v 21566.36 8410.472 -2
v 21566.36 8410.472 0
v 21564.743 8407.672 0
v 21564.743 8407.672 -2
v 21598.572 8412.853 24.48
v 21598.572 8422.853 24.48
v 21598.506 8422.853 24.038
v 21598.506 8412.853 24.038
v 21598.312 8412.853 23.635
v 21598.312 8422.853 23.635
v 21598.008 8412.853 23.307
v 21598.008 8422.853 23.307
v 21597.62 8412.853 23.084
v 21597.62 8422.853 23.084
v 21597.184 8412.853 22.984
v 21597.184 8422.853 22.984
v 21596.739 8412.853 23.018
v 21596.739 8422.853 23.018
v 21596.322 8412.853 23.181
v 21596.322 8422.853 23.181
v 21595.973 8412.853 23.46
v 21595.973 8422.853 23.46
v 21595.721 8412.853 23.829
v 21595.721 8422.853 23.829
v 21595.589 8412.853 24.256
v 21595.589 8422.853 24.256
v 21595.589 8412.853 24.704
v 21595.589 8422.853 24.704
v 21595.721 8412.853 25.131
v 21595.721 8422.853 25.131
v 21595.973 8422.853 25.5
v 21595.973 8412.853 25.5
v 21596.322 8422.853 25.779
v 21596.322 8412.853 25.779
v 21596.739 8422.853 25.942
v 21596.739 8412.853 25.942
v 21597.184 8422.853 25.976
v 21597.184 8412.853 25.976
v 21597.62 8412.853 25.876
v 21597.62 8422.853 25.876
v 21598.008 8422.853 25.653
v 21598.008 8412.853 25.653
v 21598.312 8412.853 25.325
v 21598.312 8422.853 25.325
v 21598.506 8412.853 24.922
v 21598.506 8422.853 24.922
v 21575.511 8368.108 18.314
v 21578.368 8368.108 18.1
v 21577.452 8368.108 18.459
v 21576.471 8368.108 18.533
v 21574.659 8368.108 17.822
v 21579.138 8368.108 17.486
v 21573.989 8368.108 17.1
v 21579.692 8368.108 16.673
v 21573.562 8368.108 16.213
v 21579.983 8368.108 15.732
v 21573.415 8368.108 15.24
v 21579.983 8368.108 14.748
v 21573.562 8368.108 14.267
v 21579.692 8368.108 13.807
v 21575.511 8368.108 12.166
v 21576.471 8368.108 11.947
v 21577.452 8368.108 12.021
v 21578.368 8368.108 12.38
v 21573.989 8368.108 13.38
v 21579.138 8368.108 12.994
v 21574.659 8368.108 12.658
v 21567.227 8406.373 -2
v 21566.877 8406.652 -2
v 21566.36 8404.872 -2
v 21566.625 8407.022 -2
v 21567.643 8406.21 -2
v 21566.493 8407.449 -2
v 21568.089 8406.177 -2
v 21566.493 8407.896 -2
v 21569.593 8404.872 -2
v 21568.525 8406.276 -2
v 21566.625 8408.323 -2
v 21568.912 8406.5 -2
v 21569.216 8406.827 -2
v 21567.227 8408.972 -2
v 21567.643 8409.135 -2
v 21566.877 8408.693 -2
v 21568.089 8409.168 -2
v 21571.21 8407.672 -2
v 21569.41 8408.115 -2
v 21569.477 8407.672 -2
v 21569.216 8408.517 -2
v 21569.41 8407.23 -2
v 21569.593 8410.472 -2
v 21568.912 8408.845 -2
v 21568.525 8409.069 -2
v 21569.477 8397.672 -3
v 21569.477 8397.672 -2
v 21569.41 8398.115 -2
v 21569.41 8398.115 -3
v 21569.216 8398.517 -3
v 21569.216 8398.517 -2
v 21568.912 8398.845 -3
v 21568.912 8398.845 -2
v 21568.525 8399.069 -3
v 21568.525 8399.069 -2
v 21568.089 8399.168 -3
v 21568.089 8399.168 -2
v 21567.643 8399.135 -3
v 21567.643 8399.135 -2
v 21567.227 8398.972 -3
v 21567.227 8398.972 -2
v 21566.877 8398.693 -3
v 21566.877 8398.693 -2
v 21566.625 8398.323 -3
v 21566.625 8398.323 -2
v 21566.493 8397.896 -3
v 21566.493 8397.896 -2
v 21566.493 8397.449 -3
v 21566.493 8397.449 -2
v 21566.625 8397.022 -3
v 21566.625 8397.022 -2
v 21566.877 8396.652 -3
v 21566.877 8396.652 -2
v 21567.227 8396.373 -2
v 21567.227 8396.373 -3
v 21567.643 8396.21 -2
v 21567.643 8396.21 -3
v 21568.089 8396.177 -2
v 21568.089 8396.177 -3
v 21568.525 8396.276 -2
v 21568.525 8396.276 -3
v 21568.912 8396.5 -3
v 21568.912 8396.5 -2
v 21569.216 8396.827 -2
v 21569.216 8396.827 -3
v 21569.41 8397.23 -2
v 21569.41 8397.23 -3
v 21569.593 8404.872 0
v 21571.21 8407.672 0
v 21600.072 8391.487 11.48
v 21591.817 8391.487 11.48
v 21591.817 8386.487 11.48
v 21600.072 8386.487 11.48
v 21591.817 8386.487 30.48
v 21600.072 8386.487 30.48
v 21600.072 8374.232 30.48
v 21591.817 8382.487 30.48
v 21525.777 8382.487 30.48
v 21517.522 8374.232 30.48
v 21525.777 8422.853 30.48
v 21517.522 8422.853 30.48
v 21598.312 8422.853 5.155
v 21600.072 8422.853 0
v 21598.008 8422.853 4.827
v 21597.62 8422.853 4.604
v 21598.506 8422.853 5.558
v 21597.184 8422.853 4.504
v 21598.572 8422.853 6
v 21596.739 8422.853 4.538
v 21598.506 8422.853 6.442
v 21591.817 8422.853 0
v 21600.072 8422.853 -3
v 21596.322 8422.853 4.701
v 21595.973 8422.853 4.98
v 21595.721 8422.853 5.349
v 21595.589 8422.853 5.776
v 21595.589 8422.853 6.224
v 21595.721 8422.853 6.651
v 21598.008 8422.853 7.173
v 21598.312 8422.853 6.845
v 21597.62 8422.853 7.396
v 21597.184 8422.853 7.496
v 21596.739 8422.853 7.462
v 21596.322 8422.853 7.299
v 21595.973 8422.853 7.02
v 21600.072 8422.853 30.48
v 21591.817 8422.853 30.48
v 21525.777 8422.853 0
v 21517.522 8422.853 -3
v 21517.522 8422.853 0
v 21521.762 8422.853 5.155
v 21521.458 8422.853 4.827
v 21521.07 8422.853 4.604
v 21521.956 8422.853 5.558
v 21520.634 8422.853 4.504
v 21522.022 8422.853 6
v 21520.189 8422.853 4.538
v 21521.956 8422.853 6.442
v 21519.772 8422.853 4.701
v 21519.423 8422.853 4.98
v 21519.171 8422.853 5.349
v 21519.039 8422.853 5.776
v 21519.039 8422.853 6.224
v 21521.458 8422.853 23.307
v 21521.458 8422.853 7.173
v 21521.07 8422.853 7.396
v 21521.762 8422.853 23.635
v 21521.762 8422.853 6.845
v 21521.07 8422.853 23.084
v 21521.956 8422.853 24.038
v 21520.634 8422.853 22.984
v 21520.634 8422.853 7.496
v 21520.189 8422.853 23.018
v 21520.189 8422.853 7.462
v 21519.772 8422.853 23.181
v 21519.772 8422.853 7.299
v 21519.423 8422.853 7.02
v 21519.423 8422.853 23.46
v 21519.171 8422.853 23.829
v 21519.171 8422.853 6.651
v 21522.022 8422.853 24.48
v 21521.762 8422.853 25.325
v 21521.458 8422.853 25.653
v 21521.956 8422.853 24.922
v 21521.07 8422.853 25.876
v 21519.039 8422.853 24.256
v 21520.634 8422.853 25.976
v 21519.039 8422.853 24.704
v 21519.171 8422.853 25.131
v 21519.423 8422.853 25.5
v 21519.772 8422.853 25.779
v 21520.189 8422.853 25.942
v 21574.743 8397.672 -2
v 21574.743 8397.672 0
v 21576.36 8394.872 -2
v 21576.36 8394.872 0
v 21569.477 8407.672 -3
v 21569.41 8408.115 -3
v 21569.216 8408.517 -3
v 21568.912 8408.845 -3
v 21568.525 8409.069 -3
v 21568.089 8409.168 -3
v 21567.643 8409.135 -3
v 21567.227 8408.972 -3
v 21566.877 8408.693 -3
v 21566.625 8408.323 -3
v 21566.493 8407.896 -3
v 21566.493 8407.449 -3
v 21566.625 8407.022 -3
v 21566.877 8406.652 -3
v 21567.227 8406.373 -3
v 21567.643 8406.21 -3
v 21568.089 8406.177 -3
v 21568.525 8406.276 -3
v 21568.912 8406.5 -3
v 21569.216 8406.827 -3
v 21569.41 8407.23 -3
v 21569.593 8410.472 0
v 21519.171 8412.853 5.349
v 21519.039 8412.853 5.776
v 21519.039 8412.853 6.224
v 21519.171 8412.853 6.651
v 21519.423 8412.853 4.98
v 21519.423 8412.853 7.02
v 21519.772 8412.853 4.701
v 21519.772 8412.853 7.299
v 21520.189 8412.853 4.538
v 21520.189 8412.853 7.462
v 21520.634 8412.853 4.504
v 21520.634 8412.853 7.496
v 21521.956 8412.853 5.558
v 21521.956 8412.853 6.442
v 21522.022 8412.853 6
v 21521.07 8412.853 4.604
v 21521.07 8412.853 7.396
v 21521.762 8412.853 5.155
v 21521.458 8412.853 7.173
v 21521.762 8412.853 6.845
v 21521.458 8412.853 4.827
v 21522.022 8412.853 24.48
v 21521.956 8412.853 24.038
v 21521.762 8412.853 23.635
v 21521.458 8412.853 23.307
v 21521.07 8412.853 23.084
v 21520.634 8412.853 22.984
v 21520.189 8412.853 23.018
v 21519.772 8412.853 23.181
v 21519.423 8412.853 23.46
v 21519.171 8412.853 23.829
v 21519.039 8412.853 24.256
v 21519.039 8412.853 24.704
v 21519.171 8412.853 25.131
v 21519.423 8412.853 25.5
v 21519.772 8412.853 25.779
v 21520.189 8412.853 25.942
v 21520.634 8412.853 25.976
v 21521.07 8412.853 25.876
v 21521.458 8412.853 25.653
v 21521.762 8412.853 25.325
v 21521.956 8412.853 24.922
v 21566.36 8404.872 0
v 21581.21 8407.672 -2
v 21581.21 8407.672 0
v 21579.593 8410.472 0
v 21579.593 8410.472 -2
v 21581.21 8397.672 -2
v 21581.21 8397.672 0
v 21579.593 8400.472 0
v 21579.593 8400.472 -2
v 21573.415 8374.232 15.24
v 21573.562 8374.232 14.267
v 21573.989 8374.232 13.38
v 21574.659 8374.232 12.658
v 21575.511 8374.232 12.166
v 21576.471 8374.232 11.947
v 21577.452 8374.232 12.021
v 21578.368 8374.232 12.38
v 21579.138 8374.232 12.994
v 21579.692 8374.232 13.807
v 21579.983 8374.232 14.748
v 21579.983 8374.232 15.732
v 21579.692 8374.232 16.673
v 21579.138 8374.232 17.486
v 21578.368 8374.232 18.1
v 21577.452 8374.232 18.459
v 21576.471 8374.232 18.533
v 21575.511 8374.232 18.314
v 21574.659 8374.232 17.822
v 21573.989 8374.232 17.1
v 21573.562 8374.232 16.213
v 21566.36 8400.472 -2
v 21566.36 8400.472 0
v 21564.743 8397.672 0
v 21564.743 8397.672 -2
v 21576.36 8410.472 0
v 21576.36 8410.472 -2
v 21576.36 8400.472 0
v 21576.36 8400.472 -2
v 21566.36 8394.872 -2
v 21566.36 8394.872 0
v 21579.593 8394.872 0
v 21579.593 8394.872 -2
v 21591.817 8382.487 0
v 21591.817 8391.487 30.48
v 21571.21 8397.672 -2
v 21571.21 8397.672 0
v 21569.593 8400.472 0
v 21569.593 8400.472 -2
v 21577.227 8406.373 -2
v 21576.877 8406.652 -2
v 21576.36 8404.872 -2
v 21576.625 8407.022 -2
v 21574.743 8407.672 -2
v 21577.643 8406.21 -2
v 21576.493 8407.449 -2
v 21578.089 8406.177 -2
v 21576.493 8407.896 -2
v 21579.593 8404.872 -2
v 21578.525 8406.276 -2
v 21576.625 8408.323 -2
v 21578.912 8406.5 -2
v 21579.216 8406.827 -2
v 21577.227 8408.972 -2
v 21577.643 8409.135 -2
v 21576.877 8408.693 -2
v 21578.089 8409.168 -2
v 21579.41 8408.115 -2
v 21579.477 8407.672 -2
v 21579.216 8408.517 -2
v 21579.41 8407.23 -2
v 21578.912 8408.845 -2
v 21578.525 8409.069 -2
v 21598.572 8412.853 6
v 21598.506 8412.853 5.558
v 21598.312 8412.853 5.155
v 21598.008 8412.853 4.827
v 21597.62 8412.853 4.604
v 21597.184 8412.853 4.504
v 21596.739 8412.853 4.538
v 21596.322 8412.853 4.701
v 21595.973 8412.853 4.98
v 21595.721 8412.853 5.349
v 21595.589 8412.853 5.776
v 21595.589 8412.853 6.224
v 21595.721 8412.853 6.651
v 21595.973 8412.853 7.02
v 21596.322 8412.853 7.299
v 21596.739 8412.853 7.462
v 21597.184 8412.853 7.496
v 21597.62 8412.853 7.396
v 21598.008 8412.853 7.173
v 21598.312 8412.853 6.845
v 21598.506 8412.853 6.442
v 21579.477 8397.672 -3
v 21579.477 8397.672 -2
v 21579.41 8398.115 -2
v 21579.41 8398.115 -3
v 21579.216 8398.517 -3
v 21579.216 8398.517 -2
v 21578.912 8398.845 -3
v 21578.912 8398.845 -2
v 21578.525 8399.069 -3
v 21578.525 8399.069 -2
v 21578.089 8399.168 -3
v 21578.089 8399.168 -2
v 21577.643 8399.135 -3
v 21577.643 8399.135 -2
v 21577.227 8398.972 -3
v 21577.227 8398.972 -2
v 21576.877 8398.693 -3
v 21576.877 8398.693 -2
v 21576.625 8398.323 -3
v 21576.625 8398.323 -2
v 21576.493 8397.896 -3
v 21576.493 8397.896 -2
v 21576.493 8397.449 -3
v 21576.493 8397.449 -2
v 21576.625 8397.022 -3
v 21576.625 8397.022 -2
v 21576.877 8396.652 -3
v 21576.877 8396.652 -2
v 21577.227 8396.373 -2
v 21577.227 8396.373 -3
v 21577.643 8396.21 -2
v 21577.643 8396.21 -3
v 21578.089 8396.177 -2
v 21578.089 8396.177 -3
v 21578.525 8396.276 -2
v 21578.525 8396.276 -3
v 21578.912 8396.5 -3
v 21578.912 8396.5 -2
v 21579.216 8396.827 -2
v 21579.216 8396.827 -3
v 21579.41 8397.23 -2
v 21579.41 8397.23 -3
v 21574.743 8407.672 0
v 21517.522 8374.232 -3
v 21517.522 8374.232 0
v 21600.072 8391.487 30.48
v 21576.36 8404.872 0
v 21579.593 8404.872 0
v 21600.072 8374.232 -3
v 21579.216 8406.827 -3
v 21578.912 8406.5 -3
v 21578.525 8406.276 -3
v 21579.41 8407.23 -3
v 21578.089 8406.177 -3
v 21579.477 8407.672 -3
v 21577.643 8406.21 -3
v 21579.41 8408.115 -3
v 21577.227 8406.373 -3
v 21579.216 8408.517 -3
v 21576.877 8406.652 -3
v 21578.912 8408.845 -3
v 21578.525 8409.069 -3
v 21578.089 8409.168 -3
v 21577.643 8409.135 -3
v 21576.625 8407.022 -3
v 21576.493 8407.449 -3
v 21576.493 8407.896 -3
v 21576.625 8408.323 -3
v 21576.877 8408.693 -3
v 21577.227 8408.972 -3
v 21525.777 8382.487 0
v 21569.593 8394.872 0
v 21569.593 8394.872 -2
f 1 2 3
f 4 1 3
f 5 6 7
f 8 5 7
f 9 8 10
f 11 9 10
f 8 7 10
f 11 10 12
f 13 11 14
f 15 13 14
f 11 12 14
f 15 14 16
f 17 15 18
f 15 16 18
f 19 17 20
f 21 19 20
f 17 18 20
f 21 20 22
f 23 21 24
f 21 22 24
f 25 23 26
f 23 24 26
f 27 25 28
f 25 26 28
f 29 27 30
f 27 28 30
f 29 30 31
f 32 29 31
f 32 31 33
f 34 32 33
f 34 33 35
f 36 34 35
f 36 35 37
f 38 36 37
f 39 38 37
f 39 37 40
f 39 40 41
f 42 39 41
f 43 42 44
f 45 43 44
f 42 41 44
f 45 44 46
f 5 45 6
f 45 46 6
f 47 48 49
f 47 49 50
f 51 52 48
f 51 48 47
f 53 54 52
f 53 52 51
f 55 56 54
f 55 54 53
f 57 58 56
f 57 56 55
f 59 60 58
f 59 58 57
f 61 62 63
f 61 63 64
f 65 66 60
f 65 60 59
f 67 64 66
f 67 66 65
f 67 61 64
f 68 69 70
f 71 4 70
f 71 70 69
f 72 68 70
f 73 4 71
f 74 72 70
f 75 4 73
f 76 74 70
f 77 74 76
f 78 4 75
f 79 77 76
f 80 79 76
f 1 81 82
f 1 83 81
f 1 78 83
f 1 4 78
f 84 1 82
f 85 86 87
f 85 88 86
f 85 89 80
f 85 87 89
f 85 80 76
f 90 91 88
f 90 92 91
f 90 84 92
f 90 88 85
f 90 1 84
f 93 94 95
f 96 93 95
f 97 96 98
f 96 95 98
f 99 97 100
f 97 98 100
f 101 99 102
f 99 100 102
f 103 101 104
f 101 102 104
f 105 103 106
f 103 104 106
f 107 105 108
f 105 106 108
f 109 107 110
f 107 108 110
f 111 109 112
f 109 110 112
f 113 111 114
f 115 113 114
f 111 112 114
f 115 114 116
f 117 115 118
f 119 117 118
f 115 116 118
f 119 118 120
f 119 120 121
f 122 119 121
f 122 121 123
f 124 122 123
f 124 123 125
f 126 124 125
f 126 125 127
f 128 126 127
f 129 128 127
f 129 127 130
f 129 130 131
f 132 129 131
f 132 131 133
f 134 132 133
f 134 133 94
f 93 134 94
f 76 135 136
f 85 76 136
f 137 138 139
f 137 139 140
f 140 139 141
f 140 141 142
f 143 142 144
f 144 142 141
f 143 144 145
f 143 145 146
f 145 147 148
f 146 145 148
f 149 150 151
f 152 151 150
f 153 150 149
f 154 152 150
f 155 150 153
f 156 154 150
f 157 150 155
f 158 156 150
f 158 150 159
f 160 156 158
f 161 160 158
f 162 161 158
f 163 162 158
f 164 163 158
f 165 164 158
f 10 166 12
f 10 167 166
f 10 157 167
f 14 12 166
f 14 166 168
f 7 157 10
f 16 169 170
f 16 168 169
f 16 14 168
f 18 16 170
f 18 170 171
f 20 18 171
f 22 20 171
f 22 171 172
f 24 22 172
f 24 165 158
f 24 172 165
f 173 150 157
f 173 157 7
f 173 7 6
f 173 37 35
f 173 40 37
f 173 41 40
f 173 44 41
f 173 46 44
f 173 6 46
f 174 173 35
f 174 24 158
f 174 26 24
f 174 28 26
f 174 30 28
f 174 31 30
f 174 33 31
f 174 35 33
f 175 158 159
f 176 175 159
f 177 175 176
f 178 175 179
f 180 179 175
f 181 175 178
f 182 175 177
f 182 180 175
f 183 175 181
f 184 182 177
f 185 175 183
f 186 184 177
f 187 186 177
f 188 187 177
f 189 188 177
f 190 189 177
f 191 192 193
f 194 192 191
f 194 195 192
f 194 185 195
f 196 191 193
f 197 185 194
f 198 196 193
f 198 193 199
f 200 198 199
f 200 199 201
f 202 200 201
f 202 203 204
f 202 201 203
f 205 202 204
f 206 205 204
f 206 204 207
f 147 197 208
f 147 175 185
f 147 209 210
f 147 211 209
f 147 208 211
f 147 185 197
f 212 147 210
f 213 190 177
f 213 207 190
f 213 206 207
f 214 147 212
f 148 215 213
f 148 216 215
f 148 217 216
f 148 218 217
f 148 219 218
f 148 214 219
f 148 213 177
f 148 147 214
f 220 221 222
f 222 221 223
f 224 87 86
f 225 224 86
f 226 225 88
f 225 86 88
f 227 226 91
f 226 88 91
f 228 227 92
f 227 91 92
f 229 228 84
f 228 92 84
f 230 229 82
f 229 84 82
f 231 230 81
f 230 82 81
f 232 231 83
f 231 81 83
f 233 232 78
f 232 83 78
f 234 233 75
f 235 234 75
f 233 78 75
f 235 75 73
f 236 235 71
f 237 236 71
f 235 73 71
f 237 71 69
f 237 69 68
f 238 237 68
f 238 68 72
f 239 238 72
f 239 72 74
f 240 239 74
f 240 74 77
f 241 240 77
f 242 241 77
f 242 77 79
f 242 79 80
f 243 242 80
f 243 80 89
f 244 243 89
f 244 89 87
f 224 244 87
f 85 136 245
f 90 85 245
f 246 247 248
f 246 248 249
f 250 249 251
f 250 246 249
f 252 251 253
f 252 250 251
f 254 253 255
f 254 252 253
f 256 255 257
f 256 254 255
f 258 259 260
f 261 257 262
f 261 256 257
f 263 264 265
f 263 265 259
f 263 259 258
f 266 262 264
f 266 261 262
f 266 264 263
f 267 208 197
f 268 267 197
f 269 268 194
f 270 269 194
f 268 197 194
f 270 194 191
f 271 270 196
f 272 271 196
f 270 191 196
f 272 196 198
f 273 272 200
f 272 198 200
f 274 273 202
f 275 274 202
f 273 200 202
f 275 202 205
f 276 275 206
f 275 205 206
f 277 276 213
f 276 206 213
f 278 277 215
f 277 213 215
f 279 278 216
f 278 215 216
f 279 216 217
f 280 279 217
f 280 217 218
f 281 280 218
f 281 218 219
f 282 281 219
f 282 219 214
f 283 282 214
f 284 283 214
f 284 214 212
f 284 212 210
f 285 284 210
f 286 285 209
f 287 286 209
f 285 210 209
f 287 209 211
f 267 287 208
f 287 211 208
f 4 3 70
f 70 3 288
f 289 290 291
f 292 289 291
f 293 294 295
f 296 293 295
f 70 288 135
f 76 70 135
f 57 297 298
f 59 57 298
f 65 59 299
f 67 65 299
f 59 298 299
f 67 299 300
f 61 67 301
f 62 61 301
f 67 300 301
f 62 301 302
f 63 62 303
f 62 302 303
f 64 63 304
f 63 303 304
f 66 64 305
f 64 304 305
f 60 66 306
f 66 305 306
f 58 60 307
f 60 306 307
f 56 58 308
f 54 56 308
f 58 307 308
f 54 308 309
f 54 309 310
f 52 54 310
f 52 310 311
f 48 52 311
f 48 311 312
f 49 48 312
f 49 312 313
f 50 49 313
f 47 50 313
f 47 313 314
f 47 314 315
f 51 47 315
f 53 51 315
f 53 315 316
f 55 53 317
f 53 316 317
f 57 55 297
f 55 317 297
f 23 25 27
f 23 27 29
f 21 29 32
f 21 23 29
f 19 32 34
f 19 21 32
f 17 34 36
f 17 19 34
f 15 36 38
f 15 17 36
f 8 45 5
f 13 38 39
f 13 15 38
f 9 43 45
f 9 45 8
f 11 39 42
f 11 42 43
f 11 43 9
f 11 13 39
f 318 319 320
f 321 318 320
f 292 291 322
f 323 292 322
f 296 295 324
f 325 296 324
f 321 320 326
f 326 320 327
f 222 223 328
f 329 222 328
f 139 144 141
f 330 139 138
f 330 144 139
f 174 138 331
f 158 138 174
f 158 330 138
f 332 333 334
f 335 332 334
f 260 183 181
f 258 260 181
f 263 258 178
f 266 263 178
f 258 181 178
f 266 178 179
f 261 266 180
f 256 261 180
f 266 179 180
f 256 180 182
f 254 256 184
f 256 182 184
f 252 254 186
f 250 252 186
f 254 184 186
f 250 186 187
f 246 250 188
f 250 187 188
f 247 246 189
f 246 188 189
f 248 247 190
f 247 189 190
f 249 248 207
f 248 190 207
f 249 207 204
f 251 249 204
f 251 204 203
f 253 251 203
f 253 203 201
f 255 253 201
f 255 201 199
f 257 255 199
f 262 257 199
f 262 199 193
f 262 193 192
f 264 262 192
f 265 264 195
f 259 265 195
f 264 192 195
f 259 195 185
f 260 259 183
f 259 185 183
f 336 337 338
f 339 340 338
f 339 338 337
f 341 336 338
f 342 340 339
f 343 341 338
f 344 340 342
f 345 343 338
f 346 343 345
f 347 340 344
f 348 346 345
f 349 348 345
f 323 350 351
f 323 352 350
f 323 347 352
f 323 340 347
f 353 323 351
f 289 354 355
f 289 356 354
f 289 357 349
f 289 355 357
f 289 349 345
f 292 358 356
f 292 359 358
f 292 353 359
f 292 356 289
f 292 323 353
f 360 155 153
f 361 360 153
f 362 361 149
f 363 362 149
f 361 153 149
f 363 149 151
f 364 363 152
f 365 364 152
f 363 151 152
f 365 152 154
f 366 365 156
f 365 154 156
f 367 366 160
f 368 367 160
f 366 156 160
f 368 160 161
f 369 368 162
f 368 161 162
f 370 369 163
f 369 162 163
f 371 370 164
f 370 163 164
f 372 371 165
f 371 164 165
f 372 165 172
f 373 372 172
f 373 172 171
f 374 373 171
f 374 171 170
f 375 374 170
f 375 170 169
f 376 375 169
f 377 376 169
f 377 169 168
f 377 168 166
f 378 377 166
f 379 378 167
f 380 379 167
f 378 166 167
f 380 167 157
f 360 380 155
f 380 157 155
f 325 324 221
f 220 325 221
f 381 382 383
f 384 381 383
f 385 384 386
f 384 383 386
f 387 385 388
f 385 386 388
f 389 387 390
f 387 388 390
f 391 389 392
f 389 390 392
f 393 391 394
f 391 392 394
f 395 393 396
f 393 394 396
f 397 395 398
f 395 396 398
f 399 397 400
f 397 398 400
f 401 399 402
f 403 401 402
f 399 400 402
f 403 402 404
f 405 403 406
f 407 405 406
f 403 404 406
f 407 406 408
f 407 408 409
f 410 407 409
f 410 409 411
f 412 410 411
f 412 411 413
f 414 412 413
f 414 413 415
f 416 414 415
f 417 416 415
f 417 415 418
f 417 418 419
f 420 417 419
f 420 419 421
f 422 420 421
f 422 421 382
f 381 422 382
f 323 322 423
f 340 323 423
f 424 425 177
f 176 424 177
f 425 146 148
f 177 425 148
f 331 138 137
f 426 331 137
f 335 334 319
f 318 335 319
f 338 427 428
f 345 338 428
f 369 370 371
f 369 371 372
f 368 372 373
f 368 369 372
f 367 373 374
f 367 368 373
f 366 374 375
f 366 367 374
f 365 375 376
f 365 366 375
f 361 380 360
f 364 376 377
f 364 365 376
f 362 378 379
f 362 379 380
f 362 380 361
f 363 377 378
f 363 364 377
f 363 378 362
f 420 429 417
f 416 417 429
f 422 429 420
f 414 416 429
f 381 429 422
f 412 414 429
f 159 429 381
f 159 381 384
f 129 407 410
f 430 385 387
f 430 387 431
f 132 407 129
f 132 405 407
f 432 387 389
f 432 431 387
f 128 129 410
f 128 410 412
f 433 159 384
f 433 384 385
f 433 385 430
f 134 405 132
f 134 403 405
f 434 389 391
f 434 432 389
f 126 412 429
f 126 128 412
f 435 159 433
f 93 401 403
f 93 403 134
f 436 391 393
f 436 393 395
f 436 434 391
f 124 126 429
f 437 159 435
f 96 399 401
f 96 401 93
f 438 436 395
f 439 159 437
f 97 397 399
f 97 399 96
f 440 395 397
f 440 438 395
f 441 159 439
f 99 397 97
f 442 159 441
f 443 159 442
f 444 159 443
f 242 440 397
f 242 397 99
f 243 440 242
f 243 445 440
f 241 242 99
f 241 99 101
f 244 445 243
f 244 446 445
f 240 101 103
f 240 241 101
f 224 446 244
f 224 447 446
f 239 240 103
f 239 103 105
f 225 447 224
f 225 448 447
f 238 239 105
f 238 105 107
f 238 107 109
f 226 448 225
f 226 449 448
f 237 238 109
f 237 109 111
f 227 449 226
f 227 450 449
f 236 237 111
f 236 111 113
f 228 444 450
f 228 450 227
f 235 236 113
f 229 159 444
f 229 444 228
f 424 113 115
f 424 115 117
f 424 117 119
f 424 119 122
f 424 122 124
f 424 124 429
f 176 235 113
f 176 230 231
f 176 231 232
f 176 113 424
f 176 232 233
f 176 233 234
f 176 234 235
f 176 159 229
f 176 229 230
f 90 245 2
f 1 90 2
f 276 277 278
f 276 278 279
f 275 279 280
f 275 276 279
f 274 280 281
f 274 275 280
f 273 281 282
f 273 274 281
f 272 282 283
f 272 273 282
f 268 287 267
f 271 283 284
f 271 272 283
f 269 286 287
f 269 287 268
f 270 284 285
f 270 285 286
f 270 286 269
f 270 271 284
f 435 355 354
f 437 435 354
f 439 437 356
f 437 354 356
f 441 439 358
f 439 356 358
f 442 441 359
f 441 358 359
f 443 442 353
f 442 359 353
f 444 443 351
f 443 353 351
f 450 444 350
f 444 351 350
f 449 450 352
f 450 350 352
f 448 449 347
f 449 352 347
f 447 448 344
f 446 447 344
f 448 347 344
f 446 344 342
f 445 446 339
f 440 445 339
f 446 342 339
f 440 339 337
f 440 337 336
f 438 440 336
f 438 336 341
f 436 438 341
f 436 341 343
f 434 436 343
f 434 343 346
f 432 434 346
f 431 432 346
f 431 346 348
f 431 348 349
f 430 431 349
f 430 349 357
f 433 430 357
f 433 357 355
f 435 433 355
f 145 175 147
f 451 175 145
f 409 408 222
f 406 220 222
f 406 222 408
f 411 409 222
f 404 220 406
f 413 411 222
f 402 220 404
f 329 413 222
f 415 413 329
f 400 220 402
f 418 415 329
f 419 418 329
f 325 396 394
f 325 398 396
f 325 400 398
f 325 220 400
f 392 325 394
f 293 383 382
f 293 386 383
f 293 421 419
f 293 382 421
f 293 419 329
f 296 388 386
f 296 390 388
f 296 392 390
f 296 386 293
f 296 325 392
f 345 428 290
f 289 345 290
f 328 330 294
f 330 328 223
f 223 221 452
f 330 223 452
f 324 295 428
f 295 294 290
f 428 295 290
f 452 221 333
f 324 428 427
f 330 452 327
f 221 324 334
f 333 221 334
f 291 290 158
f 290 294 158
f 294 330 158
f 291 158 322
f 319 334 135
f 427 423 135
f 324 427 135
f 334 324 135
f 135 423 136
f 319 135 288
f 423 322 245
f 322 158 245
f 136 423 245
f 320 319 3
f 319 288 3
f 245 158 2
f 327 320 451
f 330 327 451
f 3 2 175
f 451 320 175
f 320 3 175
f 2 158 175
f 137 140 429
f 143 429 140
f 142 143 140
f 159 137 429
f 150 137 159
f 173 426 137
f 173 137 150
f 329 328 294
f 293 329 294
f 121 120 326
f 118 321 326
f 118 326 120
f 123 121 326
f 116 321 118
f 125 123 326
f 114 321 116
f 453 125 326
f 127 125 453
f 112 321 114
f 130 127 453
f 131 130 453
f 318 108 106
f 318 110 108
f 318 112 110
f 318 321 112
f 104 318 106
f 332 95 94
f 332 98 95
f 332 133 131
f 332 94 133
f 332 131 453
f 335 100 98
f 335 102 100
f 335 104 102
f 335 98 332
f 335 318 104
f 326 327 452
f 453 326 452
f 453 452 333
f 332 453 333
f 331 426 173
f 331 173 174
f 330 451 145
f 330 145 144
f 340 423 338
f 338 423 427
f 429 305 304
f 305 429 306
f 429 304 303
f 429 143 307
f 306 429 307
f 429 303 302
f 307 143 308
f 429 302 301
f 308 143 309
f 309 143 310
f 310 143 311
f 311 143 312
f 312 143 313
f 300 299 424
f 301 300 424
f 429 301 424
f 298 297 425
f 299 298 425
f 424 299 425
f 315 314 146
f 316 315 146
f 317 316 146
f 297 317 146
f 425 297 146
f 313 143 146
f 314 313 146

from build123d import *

# Parameters (mm, degrees)
EXTRUDE_1_DEPTH     = 30.48
SKETCH_4_R          = 3.302
EXTRUDE_2_DEPTH     = 6.12463
SKETCH_5_W          = 82.55
SKETCH_5_H          = 48.620400001
EXTRUDE_3_DEPTH     = 3
SKETCH_6_R          = 1.5
CUT_EXTRUDE_1_DEPTH = 3
SKETCH_7_R          = 1.5
CUT_EXTRUDE_2_DEPTH = 2
SKETCH_8_R          = 1.5
CUT_EXTRUDE_3_DEPTH = 10
SKETCH_9_W          = 8.255
SKETCH_9_H          = 5
CUT_EXTRUDE_4_DEPTH = 19


with BuildPart() as part:
    # 스케치3 → 보스-돌출1 (new body)
    with BuildSketch(Plane.XY):
        Polygon((21517.522317655, 8422.852866974), (21525.777317655, 8422.852866974), (21525.777317655, 8382.487466973), (21591.817317655, 8382.487466973), (21591.817317655, 8422.852866974), (21600.072317655, 8422.852866974), (21600.072317655, 8374.232466973), (21517.522317655, 8374.232466973), align=None)
    extrude(amount=EXTRUDE_1_DEPTH)

    # 스케치4 → 보스-돌출2 (add)
    with BuildSketch(Plane(origin=(0, 8374.232466973, 0), x_dir=(-1, 0, 0), z_dir=(0, -1, 0))):
        with Locations((-21576.717457655, -15.24)):
            Circle(SKETCH_4_R)
    extrude(amount=EXTRUDE_2_DEPTH)

    # 스케치5 → 보스-돌출3 (add)
    with BuildSketch(Plane(origin=(0, 0, 0), x_dir=(-1, 0, 0), z_dir=(0, 0, -1))):
        with Locations((-21558.797317655, 8398.542666974)):
            Rectangle(SKETCH_5_W, SKETCH_5_H)
    extrude(amount=EXTRUDE_3_DEPTH)

    # 스케치6 → 컷-돌출1 (cut)
    with BuildSketch(Plane.XY):
        with Locations((21577.97657564, 8407.672466973)):
            Circle(SKETCH_6_R)
        with Locations((21567.97657564, 8407.672466973)):
            Circle(SKETCH_6_R)
        with Locations((21567.97657564, 8397.672466973)):
            Circle(SKETCH_6_R)
        with Locations((21577.97657564, 8397.672466973)):
            Circle(SKETCH_6_R)
    extrude(amount=-CUT_EXTRUDE_1_DEPTH, mode=Mode.SUBTRACT)

    # 스케치7 → 컷-돌출2 (cut)
    with BuildSketch(Plane.XY):
        Polygon((21569.593155483, 8410.472467064), (21566.359995798, 8410.472467064), (21564.743415955, 8407.672466973), (21566.359995798, 8404.872466883), (21569.593155483, 8404.872466883), (21571.209735325, 8407.672466973), align=None)
        with Locations((21567.97657564, 8407.672466973)):
            Circle(SKETCH_7_R, mode=Mode.SUBTRACT)
        Polygon((21569.593155483, 8400.472467064), (21566.359995798, 8400.472467064), (21564.743415955, 8397.672466973), (21566.359995798, 8394.872466883), (21569.593155483, 8394.872466883), (21571.209735325, 8397.672466973), align=None)
        with Locations((21567.97657564, 8397.672466973)):
            Circle(SKETCH_7_R, mode=Mode.SUBTRACT)
        Polygon((21579.593155483, 8400.472467064), (21576.359995798, 8400.472467064), (21574.743415955, 8397.672466973), (21576.359995798, 8394.872466883), (21579.593155483, 8394.872466883), (21581.209735325, 8397.672466973), align=None)
        with Locations((21577.97657564, 8397.672466973)):
            Circle(SKETCH_7_R, mode=Mode.SUBTRACT)
        Polygon((21579.593155483, 8410.472467064), (21576.359995798, 8410.472467064), (21574.743415955, 8407.672466973), (21576.359995798, 8404.872466883), (21579.593155483, 8404.872466883), (21581.209735325, 8407.672466973), align=None)
        with Locations((21577.97657564, 8407.672466973)):
            Circle(SKETCH_7_R, mode=Mode.SUBTRACT)
    extrude(amount=-CUT_EXTRUDE_2_DEPTH, mode=Mode.SUBTRACT)

    # 스케치8 → 컷-돌출3 (cut)
    with BuildSketch(Plane(origin=(0, 8422.852866974, 0), x_dir=(1, 0, 0), z_dir=(0, 1, 0))):
        with Locations((21597.072317655, -6)):
            Circle(SKETCH_8_R)
        with Locations((21597.072317655, -24.48)):
            Circle(SKETCH_8_R)
        with Locations((21520.522317655, -24.48)):
            Circle(SKETCH_8_R)
        with Locations((21520.522317655, -6)):
            Circle(SKETCH_8_R)
    extrude(amount=-CUT_EXTRUDE_3_DEPTH, mode=Mode.SUBTRACT)

    # 스케치9 → 컷-돌출4 (cut)
    with BuildSketch(Plane.XY.offset(30.48)):
        with Locations((21595.944817655, 8388.987466973)):
            Rectangle(SKETCH_9_W, SKETCH_9_H)
    extrude(amount=-CUT_EXTRUDE_4_DEPTH, mode=Mode.SUBTRACT)


solid = part.part
